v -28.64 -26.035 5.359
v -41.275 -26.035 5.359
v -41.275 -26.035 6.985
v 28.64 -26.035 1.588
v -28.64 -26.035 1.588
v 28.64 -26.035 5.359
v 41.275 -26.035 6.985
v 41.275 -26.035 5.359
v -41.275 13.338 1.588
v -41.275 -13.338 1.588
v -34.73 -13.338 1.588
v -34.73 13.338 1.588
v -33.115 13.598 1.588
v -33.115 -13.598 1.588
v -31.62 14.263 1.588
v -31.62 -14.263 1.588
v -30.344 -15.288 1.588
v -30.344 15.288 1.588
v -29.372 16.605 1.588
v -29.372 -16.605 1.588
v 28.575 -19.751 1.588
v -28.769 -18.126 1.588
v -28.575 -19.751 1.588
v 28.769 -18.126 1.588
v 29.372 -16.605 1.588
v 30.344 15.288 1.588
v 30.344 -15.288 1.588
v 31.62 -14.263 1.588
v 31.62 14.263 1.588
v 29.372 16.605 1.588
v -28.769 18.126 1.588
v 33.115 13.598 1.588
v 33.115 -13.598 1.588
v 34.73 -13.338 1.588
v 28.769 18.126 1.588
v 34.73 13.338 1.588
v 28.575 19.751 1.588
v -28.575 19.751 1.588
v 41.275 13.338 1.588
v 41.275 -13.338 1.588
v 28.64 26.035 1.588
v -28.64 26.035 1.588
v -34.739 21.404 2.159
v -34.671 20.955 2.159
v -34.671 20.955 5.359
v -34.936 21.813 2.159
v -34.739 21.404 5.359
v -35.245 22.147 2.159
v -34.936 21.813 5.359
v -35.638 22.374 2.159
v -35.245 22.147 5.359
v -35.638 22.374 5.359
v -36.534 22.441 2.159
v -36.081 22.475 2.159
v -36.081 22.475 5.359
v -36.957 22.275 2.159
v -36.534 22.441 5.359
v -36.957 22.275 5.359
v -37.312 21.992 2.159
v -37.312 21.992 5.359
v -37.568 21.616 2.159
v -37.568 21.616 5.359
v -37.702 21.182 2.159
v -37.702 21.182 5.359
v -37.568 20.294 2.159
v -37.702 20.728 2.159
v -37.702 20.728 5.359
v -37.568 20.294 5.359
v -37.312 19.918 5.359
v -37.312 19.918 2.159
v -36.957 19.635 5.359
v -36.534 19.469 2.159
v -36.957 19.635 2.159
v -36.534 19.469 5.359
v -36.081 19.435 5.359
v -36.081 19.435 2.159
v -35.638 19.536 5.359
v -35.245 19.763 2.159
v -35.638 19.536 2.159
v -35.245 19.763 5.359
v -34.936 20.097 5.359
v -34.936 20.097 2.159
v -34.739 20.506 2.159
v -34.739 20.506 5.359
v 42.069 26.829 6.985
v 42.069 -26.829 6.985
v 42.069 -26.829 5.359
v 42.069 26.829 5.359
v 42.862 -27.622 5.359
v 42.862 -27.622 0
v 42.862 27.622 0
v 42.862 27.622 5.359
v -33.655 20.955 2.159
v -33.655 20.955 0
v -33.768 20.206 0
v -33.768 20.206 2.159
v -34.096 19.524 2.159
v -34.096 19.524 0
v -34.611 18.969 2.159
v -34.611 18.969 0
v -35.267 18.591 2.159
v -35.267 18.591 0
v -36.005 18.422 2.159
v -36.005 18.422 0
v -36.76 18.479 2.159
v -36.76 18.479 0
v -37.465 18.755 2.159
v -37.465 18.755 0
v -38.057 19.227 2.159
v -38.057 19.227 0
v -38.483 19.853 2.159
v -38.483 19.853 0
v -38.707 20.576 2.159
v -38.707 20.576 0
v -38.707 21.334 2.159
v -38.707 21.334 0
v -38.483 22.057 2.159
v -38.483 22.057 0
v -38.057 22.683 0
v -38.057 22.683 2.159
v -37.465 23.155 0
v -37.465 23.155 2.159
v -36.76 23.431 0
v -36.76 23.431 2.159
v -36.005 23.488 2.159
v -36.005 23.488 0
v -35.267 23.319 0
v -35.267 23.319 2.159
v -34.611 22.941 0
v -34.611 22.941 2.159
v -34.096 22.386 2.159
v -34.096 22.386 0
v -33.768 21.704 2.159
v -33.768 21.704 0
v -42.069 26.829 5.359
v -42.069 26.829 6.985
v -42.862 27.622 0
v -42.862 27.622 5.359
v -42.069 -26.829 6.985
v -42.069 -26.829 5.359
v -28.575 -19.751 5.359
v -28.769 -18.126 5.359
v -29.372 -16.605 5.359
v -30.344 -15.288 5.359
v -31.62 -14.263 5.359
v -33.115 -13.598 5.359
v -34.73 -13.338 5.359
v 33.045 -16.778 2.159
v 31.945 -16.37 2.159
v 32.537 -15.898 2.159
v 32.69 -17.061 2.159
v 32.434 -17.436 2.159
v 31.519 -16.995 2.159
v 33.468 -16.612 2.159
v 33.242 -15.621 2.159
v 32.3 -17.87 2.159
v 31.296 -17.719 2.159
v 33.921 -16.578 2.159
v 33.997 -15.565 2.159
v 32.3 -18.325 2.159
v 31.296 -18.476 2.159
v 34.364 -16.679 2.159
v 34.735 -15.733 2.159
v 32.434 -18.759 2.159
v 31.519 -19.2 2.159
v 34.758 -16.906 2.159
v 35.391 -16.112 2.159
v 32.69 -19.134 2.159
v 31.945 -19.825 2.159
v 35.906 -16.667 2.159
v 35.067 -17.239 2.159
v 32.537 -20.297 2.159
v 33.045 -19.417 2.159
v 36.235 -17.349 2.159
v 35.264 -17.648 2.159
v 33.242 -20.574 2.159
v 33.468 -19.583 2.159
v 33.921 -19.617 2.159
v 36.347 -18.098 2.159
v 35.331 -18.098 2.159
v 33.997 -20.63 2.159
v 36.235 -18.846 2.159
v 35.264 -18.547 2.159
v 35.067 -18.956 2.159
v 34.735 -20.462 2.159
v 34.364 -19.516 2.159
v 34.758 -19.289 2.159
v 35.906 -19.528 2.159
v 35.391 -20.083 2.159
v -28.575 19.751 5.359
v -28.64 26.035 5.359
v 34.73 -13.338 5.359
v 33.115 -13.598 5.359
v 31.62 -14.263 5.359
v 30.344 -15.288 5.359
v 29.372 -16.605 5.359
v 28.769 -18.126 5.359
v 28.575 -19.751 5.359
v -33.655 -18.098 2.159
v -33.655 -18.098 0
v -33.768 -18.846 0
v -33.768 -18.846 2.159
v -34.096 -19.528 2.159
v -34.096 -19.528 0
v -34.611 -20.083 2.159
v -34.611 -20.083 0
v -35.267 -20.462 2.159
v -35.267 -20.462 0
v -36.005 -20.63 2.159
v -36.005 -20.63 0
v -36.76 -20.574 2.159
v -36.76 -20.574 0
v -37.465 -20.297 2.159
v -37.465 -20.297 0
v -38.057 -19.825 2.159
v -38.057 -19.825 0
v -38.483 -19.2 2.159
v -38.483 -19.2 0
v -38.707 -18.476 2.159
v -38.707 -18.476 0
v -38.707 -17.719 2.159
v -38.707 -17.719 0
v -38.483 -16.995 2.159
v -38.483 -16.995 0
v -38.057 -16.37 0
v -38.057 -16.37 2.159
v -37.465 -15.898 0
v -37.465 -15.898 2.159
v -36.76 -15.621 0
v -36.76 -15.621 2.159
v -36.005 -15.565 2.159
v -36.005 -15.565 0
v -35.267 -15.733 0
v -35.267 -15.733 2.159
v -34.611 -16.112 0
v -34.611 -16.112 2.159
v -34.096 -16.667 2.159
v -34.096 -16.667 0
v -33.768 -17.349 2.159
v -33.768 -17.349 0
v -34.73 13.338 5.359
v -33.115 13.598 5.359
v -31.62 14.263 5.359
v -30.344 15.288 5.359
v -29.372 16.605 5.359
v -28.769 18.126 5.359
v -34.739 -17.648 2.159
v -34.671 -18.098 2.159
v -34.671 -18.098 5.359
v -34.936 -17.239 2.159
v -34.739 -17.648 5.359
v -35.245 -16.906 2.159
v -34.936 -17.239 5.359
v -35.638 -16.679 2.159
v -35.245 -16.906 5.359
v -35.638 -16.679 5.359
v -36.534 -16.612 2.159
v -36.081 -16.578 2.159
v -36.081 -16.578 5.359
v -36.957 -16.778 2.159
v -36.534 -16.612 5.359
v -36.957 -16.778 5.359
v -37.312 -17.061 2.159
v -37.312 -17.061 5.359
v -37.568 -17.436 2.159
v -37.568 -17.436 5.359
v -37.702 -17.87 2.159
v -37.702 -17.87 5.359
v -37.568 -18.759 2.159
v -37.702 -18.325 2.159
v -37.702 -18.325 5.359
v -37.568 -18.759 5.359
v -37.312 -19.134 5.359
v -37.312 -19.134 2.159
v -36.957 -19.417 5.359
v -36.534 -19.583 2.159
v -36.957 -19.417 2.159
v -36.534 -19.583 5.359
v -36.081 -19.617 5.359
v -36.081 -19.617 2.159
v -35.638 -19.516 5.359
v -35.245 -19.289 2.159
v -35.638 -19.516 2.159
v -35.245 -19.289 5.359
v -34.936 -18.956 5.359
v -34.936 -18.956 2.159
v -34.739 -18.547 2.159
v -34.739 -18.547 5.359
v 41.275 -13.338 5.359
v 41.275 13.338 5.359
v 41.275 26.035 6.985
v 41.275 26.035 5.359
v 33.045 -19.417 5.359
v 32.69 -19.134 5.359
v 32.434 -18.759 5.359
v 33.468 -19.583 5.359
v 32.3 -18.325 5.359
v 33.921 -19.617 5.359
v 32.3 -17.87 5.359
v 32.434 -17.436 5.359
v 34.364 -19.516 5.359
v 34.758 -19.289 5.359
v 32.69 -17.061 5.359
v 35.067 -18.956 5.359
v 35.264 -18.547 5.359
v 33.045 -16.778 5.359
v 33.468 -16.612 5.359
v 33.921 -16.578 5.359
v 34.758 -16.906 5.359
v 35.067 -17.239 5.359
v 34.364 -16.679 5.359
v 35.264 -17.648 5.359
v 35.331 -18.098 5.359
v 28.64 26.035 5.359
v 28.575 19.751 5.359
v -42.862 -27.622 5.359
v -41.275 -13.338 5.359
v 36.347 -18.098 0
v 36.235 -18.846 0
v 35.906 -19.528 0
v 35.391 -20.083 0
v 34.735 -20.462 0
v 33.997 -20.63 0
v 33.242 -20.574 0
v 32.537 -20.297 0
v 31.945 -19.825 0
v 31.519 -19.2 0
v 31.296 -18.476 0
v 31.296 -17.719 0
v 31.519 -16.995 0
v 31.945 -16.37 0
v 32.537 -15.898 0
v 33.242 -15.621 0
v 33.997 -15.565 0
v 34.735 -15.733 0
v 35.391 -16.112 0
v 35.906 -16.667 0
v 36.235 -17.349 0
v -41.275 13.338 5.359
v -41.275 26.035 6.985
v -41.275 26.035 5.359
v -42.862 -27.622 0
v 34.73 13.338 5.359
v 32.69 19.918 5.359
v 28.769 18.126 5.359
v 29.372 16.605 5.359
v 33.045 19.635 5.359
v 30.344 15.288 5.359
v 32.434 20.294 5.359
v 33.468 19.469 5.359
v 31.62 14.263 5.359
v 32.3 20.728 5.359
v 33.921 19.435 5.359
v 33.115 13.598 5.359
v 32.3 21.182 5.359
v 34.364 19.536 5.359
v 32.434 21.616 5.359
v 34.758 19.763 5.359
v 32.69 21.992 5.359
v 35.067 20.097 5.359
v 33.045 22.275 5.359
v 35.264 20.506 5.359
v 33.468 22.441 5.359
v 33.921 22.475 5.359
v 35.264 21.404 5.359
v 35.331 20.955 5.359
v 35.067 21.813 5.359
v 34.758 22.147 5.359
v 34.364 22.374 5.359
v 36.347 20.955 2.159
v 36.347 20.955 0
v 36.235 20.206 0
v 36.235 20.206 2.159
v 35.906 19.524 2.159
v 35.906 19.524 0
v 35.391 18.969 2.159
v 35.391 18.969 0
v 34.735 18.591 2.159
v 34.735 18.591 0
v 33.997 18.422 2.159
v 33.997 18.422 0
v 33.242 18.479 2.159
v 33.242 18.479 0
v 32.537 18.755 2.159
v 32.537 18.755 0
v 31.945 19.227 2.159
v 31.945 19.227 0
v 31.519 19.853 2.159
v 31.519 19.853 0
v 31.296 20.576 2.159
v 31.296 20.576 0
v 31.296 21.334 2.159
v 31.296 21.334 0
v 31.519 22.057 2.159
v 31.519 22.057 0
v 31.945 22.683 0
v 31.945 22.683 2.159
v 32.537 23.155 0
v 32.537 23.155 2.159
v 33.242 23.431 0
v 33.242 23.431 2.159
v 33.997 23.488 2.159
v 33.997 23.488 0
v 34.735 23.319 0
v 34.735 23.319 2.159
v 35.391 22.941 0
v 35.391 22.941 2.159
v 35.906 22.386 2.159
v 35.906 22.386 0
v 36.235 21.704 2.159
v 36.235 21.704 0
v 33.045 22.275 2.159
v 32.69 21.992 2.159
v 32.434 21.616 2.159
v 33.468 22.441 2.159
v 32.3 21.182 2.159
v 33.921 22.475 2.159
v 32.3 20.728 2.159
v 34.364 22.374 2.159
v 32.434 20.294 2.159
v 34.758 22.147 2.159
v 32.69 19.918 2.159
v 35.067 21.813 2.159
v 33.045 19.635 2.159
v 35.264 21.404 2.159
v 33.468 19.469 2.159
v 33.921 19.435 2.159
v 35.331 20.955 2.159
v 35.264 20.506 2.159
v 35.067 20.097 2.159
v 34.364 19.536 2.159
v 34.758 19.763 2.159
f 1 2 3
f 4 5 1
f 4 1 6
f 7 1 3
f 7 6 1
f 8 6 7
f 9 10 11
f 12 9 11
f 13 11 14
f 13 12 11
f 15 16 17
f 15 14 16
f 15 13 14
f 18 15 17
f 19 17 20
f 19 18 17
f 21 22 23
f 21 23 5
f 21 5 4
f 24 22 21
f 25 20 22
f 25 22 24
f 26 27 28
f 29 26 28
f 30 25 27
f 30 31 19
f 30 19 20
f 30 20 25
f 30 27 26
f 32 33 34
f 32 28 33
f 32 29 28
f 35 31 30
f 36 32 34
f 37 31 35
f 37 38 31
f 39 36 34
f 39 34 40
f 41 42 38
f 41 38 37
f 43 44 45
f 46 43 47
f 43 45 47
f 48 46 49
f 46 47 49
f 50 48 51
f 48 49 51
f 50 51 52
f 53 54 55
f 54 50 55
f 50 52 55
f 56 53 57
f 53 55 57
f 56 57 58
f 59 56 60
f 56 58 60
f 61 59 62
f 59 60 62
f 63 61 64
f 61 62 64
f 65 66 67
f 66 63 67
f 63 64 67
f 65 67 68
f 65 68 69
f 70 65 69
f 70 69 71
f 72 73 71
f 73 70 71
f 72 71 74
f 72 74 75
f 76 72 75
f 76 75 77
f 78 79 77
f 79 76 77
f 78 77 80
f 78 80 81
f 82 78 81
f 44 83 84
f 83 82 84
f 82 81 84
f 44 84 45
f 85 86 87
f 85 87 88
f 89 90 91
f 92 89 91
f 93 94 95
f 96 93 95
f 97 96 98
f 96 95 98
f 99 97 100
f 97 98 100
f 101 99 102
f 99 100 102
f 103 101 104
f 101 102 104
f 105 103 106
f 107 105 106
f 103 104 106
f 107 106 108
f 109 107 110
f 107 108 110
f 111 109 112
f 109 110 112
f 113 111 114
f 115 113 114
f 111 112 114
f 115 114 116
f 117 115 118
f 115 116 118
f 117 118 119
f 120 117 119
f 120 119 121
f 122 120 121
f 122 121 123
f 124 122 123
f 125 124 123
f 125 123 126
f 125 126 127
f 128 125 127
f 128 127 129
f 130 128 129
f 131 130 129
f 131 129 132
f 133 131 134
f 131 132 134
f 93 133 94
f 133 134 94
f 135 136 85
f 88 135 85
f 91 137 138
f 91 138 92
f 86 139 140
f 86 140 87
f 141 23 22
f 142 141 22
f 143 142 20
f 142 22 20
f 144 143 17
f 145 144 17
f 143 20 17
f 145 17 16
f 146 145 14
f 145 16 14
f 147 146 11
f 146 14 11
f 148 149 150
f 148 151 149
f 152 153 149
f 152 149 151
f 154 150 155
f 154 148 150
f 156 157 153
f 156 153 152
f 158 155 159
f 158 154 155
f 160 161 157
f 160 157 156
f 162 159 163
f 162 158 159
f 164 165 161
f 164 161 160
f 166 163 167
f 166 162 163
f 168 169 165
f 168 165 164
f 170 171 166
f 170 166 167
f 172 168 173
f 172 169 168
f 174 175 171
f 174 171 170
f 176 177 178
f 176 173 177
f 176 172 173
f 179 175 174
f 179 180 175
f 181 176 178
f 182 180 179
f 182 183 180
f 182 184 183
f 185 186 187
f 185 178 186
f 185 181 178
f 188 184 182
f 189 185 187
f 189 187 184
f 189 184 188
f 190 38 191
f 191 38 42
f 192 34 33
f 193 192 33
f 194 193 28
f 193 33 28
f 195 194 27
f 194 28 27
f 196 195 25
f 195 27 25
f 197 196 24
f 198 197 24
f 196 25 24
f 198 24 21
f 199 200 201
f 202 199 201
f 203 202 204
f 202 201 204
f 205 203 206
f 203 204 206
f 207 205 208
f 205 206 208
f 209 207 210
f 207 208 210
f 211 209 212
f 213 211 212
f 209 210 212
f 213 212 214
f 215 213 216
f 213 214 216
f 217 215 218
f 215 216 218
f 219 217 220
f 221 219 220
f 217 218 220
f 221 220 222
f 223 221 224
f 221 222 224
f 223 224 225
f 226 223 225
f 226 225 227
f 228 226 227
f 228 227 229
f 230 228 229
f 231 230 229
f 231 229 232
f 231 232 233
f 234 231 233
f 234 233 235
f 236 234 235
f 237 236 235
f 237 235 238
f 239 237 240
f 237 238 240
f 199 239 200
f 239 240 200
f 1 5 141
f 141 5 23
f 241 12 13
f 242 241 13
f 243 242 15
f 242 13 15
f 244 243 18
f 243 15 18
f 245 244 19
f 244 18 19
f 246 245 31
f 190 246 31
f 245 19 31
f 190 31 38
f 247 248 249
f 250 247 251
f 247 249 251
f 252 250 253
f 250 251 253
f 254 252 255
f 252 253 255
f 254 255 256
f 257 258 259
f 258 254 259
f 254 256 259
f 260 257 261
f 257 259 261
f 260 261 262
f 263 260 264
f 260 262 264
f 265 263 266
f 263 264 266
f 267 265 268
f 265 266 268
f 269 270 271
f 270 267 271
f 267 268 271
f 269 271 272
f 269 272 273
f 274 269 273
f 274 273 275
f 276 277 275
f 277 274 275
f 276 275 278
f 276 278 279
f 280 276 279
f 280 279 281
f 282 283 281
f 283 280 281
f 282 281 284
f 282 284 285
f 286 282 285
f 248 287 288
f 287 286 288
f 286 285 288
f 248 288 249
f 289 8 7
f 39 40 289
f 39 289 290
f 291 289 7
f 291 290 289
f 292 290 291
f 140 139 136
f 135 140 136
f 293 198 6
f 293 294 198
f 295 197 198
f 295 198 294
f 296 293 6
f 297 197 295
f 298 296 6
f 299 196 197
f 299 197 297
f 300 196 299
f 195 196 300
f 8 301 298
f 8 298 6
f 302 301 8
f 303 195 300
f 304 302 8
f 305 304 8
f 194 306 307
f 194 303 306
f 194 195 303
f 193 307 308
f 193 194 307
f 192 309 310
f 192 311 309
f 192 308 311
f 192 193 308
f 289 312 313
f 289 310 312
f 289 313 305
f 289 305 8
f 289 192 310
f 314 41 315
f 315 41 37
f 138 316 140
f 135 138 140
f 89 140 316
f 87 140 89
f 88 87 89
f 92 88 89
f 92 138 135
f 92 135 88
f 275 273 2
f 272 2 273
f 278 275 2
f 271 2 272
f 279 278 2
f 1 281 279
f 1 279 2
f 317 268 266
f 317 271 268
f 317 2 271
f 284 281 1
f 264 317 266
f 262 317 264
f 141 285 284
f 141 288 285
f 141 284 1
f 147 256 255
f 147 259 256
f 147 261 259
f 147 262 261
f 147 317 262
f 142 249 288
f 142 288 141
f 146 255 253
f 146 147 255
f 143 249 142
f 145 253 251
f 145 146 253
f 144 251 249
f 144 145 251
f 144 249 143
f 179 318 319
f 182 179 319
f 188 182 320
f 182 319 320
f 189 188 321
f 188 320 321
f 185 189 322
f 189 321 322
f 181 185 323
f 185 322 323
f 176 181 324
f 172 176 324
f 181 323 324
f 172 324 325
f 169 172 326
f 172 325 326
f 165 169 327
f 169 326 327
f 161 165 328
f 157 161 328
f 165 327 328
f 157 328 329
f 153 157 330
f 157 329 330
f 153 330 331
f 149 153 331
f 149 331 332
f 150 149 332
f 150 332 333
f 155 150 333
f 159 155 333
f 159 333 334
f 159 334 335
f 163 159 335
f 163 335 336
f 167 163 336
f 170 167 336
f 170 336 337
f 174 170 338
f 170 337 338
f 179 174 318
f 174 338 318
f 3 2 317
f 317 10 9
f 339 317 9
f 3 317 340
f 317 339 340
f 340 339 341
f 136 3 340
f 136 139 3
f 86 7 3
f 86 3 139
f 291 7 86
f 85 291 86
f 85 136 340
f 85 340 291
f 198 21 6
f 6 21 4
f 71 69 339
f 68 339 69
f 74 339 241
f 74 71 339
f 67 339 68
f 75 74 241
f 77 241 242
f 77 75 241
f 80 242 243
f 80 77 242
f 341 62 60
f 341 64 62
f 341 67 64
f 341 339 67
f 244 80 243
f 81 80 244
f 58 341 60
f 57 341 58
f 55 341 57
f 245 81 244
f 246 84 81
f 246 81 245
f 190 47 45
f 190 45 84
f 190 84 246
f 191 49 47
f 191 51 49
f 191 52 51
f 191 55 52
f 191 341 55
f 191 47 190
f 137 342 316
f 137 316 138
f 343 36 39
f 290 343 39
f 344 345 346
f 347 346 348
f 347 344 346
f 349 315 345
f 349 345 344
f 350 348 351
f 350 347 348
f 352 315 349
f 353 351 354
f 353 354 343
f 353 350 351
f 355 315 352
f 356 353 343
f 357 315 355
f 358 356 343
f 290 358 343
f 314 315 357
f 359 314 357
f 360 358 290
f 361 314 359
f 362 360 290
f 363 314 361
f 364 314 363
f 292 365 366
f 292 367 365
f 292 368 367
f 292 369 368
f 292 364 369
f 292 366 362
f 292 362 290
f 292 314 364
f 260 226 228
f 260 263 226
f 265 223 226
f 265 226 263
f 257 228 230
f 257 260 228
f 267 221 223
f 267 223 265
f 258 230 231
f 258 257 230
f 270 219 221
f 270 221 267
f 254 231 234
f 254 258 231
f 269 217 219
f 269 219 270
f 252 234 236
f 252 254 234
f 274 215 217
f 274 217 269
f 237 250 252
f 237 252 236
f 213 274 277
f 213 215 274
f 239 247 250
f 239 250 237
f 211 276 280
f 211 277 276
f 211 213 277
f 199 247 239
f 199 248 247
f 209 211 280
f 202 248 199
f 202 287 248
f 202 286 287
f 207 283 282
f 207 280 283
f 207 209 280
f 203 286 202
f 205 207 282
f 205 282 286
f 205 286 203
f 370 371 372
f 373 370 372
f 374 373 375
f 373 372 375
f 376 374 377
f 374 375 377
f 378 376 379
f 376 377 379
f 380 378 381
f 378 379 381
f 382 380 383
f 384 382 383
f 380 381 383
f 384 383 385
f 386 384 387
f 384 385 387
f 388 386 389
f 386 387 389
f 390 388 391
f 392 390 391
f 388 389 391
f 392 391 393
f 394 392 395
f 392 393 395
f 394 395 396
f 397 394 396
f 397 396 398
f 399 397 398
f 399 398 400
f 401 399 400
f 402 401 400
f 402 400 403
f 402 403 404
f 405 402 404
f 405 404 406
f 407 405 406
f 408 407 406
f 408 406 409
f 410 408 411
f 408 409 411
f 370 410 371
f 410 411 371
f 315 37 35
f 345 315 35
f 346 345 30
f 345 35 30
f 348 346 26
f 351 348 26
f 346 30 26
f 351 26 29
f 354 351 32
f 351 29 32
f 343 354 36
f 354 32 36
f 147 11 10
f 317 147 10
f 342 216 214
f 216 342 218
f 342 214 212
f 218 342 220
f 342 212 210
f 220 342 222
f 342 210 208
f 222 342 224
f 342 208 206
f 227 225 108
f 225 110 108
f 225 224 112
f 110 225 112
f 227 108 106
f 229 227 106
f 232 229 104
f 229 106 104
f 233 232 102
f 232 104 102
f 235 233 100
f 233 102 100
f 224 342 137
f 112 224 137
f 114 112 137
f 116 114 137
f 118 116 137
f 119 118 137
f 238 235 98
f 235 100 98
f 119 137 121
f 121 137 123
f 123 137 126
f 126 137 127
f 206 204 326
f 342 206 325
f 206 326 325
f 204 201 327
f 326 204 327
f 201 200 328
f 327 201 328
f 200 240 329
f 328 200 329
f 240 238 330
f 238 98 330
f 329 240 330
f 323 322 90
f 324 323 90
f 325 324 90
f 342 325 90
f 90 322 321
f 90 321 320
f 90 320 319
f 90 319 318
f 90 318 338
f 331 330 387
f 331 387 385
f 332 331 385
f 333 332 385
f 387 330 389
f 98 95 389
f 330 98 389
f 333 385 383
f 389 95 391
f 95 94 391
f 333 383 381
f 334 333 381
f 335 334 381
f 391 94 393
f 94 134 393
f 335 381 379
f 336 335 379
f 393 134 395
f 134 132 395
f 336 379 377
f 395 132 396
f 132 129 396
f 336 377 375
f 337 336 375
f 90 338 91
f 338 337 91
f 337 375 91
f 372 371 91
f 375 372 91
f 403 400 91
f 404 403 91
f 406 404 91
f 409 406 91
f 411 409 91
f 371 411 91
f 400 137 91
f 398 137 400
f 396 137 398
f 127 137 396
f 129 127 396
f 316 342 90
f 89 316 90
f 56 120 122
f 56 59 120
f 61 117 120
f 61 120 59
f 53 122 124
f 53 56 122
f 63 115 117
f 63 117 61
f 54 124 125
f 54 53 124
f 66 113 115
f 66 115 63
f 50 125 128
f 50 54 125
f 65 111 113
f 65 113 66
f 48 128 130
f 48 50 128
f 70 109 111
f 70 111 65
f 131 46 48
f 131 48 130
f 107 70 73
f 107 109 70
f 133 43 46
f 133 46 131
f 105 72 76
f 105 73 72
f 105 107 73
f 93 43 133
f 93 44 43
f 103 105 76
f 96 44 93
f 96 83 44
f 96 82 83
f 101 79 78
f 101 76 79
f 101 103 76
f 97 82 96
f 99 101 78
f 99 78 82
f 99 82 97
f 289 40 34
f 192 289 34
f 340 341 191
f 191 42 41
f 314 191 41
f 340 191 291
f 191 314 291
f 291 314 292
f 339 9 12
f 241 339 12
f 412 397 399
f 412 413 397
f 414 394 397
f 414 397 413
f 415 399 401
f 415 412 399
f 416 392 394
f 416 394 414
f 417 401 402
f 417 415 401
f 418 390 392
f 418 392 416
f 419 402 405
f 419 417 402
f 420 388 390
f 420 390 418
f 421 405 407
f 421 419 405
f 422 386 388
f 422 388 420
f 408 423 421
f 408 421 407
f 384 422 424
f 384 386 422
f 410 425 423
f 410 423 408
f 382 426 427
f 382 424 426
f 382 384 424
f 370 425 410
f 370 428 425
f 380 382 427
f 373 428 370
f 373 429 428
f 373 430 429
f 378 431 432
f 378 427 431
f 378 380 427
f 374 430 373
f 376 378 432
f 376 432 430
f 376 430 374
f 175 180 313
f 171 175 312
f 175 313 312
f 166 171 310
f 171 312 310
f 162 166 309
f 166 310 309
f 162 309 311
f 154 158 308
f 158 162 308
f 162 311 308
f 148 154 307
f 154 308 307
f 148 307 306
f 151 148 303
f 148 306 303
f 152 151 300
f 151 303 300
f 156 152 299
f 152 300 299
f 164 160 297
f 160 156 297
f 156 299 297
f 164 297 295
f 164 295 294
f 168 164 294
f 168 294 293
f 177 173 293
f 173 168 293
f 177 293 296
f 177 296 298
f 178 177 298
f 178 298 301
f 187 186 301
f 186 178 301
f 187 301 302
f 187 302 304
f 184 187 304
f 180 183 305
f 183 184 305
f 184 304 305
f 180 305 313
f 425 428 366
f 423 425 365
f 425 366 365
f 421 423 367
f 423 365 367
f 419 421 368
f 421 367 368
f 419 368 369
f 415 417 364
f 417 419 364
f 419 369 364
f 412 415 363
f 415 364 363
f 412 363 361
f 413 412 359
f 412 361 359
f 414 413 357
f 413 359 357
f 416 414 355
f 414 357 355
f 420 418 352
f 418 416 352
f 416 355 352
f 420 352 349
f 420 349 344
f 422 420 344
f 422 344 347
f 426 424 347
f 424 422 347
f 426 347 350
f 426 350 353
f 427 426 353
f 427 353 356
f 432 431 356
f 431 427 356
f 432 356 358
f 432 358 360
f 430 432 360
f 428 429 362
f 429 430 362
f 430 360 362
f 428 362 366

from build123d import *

# Parameters (mm, degrees)
F0_W      = 85.725
F0_H      = 55.245
F1_DEPTH  = 6.985
F2_T      = -1.5875
F4_DEPTH  = 3.7719
F5_R      = 1.524
F6_DEPTH  = 5.3604
F7_R      = 2.54
F7_R_2    = 1.524
F8_DEPTH  = 2.159
F9_W      = 85.725
F9_H      = 55.245
F9_W_2    = 84.1375
F9_H_2    = 53.6575
F10_DEPTH = 1.6256


with BuildPart() as f1:
    # F0 (on Top) → F1 (new body)
    with BuildSketch(Plane.XY):
        Rectangle(F0_W, F0_H)
    extrude(amount=F1_DEPTH)

    # F2
    f2_openings = [f1.faces().sort_by_distance(p)[0] for p in [
        (0, 0, 6.985),
    ]]
    offset(amount=F2_T, openings=f2_openings)

    # F3 (on face) → F4 (join)
    with BuildSketch(Plane.XY.offset(1.5875)):
        with BuildLine():
            Line((-41.275, 13.3379847444), (-35.1196724052, 13.3379847444))
            Line((-35.1196724052, 13.3379847444), (-34.7303275948, 13.3379847444))
            ThreePointArc((-34.7303275948, 13.3379847444), (-30.3438107725, 15.2878184866), (-28.5753382402, 19.7505403419))
            Line((-28.5753382402, 19.7505403419), (-28.6402055749, 26.035))
            Line((-28.6402055749, 26.035), (-41.275, 26.035))
            Line((-41.275, 26.035), (-41.275, 13.3379847444))
        make_face()
        with BuildLine():
            Line((41.275, 26.035), (28.6402055749, 26.035))
            Line((28.6402055749, 26.035), (28.5753382402, 19.7505403419))
            ThreePointArc((28.5753382402, 19.7505403419), (30.3438107725, 15.2878184866), (34.7303275948, 13.3379847444))
            Line((34.7303275948, 13.3379847444), (35.1196724052, 13.3379847444))
            Line((35.1196724052, 13.3379847444), (41.275, 13.3379847444))
            Line((41.275, 13.3379847444), (41.275, 26.035))
        make_face()
        with BuildLine():
            Line((28.5753382402, -19.7505403419), (28.6402055749, -26.035))
            Line((28.6402055749, -26.035), (41.275, -26.035))
            Line((41.275, -26.035), (41.275, -13.3379847444))
            Line((41.275, -13.3379847444), (35.1196724052, -13.3379847444))
            Line((35.1196724052, -13.3379847444), (34.7303275948, -13.3379847444))
            ThreePointArc((34.7303275948, -13.3379847444), (30.3438107725, -15.2878184866), (28.5753382402, -19.7505403419))
        make_face()
        with BuildLine():
            Line((-35.1196724052, -13.3379847444), (-41.275, -13.3379847444))
            Line((-41.275, -13.3379847444), (-41.275, -26.035))
            Line((-41.275, -26.035), (-28.6402055749, -26.035))
            Line((-28.6402055749, -26.035), (-28.5753382402, -19.7505403419))
            ThreePointArc((-28.5753382402, -19.7505403419), (-30.3438107725, -15.2878184866), (-34.7303275948, -13.3379847444))
            Line((-34.7303275948, -13.3379847444), (-35.1196724052, -13.3379847444))
        make_face()
    extrude(amount=F4_DEPTH)

    # F5 (on face) → F6 (cut, through all)
    with BuildSketch(Plane.XY.offset(5.3594)):
        with Locations((33.8074, 20.955)):
            Circle(F5_R)
        with Locations((-36.195, 20.955)):
            Circle(F5_R)
        with Locations((-36.195, -18.0975)):
            Circle(F5_R)
        with Locations((33.8074, -18.0975)):
            Circle(F5_R)
    extrude(amount=-F6_DEPTH, mode=Mode.SUBTRACT)

    # F7 (on face) → F8 (cut)
    with BuildSketch(Plane(origin=(0, 0, 0), x_dir=(1, 0, 0), z_dir=(0, 0, -1))):
        with Locations((-36.195, 18.0975)):
            Circle(F7_R)
        with Locations((-36.195, 18.0975)):
            Circle(F7_R_2, mode=Mode.SUBTRACT)
        with Locations((33.8074, 18.0975)):
            Circle(F7_R)
        with Locations((33.8074, 18.0975)):
            Circle(F7_R_2, mode=Mode.SUBTRACT)
        with Locations((33.8074, -20.955)):
            Circle(F7_R)
        with Locations((33.8074, -20.955)):
            Circle(F7_R_2, mode=Mode.SUBTRACT)
        with Locations((-36.195, -20.955)):
            Circle(F7_R)
        with Locations((-36.195, -20.955)):
            Circle(F7_R_2, mode=Mode.SUBTRACT)
    extrude(amount=-F8_DEPTH, mode=Mode.SUBTRACT)

    # F9 (on face) → F10 (cut)
    with BuildSketch(Plane.XY.offset(6.985)):
        Rectangle(F9_W, F9_H)
        Rectangle(F9_W_2, F9_H_2, mode=Mode.SUBTRACT)
    extrude(amount=-F10_DEPTH, mode=Mode.SUBTRACT)


solid = f1.part
